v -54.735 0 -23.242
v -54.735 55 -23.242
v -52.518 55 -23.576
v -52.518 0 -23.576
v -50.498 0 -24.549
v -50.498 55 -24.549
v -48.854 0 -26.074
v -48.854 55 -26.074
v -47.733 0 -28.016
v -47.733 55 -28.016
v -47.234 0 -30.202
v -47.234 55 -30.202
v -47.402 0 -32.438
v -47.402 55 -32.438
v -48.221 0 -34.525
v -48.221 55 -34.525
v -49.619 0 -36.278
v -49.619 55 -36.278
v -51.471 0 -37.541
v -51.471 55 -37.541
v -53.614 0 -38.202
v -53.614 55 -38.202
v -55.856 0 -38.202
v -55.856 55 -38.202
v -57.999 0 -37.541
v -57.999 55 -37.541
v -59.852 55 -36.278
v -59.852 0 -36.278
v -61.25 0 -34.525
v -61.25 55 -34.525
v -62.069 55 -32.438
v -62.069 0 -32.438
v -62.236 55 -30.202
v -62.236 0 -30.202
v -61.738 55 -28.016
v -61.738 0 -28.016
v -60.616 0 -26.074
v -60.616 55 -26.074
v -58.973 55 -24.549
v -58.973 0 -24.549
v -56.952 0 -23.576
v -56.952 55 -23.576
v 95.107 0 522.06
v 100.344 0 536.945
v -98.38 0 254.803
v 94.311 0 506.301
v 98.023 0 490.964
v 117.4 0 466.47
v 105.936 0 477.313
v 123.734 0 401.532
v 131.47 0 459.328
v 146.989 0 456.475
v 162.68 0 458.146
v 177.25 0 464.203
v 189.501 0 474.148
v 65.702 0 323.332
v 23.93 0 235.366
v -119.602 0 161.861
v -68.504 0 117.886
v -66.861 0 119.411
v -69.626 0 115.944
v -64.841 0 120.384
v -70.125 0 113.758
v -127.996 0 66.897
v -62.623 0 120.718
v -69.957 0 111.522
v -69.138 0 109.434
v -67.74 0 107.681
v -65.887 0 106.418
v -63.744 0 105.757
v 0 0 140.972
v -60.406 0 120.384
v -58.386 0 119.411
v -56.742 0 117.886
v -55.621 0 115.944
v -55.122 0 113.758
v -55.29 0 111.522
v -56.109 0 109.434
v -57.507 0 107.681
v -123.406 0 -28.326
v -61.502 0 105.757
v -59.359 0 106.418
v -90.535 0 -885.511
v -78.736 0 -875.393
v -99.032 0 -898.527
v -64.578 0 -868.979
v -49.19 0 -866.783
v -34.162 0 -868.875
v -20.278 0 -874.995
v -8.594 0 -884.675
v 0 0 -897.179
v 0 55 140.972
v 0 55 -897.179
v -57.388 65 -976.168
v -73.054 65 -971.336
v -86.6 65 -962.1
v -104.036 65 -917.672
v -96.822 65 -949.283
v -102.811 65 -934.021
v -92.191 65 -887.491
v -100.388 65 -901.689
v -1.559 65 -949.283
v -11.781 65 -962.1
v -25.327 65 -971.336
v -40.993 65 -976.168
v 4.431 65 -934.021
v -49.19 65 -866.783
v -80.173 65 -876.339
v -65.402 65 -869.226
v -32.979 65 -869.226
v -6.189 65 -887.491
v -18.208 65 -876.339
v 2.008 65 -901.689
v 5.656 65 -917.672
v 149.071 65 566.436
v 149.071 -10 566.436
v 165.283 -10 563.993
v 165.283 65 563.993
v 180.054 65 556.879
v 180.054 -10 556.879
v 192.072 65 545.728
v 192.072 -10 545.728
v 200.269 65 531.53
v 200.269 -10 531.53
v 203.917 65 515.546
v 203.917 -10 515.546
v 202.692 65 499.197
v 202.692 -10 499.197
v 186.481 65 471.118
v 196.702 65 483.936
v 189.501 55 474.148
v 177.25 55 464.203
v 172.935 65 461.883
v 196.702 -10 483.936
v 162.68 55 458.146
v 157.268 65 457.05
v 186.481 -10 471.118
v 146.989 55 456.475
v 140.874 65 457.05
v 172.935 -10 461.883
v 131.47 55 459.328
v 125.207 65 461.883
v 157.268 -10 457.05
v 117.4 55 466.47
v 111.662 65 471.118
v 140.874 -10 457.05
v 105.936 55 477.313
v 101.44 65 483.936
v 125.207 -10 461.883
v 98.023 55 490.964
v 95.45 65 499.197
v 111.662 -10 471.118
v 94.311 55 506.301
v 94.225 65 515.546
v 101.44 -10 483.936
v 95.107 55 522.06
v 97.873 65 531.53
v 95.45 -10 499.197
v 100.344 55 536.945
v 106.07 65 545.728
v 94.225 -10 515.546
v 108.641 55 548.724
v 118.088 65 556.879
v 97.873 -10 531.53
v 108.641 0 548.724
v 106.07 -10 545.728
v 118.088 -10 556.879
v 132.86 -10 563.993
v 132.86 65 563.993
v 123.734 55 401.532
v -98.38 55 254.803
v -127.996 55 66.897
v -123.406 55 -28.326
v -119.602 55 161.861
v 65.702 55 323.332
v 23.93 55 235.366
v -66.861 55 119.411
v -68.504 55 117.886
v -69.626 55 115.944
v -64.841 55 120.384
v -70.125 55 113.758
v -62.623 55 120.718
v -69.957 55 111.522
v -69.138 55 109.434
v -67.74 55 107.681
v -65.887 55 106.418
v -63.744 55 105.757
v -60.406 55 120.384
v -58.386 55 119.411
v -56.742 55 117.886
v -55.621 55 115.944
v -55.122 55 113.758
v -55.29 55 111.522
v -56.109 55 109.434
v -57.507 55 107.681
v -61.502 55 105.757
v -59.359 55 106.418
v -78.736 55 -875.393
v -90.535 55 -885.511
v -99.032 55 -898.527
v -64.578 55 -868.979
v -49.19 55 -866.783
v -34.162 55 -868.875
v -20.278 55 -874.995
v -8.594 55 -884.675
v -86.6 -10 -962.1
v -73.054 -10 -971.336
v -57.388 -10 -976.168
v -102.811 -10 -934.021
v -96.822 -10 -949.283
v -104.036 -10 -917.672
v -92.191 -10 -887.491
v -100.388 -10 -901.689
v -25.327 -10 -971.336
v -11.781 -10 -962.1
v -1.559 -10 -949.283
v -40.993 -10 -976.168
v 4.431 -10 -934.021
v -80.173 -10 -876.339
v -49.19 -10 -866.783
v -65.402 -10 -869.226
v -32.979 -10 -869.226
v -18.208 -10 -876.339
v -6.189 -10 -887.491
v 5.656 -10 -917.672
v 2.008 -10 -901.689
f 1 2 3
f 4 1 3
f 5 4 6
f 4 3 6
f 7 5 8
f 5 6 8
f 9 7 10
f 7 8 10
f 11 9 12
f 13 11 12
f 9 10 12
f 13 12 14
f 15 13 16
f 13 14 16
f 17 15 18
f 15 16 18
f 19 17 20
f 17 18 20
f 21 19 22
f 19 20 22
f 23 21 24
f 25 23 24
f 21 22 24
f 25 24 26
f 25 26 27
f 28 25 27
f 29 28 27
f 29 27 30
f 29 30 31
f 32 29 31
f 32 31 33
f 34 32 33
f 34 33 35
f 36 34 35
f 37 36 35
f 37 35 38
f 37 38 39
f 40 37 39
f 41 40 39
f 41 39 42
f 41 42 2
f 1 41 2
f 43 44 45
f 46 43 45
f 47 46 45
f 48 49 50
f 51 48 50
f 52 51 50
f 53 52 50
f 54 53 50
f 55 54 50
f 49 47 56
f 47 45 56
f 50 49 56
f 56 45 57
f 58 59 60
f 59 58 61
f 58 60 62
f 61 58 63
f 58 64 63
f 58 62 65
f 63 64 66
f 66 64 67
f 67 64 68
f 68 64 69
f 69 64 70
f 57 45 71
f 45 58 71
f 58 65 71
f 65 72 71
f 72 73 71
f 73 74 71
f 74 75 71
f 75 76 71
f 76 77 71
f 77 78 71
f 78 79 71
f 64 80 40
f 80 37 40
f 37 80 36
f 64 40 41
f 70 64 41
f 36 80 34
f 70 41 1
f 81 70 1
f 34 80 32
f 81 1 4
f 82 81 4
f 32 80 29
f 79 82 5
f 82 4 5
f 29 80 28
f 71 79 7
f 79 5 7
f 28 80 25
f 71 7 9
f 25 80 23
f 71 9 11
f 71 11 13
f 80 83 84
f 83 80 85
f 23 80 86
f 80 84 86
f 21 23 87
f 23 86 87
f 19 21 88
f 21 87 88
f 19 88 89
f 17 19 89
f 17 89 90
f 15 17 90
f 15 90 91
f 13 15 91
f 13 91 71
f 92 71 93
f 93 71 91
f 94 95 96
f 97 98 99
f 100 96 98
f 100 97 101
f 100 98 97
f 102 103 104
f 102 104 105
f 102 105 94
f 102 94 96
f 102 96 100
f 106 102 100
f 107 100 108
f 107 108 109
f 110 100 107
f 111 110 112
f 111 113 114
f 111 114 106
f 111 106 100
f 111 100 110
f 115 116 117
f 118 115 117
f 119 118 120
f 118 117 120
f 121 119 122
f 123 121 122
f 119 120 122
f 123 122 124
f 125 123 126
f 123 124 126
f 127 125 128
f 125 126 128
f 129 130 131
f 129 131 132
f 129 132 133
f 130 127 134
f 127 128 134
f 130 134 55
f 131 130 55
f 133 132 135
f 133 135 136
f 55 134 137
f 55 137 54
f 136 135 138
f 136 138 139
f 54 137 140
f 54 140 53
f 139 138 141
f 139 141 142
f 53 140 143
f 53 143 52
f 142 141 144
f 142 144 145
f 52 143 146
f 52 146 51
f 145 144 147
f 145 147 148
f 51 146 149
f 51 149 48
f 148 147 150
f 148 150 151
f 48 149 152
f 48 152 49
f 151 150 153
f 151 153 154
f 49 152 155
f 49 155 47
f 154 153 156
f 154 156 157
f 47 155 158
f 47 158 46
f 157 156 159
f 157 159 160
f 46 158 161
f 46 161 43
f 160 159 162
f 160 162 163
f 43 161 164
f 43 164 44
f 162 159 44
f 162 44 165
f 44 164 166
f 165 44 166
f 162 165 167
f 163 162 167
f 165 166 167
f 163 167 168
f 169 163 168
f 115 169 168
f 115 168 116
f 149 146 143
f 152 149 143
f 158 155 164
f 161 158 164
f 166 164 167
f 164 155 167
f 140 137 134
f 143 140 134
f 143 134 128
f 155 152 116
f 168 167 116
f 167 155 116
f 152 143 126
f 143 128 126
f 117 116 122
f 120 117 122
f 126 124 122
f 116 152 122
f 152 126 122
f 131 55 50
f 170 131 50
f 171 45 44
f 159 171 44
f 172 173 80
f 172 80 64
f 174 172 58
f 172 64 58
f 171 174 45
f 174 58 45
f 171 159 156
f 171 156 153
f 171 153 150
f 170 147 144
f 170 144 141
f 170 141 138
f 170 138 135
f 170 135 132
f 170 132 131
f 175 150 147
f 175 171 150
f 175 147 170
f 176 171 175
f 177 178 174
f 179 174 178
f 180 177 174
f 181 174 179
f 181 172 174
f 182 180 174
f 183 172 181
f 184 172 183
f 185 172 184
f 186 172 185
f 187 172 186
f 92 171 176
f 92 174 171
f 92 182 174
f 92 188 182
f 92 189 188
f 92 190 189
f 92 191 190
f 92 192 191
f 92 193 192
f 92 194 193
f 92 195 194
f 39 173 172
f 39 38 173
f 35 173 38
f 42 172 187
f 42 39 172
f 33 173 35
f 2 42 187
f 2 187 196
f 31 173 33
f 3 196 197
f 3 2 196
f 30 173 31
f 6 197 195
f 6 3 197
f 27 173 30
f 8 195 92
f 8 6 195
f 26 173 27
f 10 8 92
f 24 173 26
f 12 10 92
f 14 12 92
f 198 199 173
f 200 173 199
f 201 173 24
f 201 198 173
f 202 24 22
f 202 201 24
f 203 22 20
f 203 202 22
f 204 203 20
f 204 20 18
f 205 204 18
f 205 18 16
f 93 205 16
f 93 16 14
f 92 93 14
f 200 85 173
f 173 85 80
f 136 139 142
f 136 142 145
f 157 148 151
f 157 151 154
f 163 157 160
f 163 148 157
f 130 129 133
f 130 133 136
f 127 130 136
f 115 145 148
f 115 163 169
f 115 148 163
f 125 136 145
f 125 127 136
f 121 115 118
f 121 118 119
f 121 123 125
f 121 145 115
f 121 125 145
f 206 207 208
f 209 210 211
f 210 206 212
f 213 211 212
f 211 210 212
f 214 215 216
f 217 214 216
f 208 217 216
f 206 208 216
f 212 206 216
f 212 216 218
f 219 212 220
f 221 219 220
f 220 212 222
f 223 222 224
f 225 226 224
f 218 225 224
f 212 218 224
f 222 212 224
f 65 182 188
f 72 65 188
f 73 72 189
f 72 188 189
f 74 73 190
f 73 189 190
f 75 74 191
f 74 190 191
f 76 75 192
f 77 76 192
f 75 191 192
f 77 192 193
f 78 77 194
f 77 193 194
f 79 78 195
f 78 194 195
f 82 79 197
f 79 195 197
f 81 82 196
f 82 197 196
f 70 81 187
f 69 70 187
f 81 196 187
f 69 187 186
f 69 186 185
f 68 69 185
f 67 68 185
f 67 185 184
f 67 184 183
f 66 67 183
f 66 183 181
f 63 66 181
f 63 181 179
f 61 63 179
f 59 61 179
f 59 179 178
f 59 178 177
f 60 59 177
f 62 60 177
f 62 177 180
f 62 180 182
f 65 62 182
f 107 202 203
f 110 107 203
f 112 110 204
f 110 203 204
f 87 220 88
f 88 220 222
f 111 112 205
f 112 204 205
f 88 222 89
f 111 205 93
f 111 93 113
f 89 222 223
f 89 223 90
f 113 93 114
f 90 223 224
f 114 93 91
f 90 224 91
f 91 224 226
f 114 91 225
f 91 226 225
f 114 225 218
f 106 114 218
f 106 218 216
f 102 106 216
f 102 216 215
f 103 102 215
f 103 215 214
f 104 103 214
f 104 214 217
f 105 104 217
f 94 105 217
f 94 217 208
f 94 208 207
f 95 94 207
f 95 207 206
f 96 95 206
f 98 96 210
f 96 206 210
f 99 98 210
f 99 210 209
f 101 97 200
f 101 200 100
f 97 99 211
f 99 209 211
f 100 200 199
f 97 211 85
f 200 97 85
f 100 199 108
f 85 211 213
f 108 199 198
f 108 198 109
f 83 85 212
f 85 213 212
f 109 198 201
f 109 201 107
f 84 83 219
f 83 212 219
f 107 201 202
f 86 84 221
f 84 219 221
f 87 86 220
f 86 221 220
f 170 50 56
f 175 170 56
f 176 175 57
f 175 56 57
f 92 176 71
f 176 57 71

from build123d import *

# Parameters (mm, degrees)
BOSS_EXTRUDE1_DEPTH      = 55
BOSS_EXTRUDE2_DEPTH      = 10
BOSS_EXTRUDE2_DEPTH_BACK = 65
SKETCH2_R                = 55
SKETCH3_R                = 7.522289104
CUT_EXTRUDE1_DEPTH       = 1000.987090528


with BuildPart() as part:
    # Sketch1 → Boss-Extrude1 (new body)
    with BuildSketch(Plane(origin=(0, 0, 0), x_dir=(1, 0, 0), z_dir=(0, 1, 0))):
        with BuildLine():
            Line((0, -140.97167407), (0, 921.782563534))
            Line((0, 921.782563534), (-98.380397364, 921.782563534))
            Line((-98.380397364, 921.782563534), (-123.405755698, 28.326097488))
            ThreePointArc((-123.405755698, 28.326097488), (-125.417562899, -114.522053174), (-98.380397364, -254.80260491))
            Line((-98.380397364, -254.80260491), (108.641172319, -548.724400702))
            Line((108.641172319, -548.724400702), (189.500983305, -474.147655215))
            Line((189.500983305, -474.147655215), (123.733893044, -401.532470648))
            ThreePointArc((123.733893044, -401.532470648), (42.669425171, -280.368501556), (0, -140.97167407))
        make_face()
    extrude(amount=BOSS_EXTRUDE1_DEPTH)

    # Sketch2 → Boss-Extrude2 (add, two sides: drawn at the far end of the back side and taken through both)
    with BuildSketch(Plane(origin=(0, 55, 0), x_dir=(1, 0, 0), z_dir=(0, 1, 0)).offset(-BOSS_EXTRUDE2_DEPTH_BACK)):
        with Locations(Location((149.071077812, -511.436027959, 0), (0, 0, 270))):
            Circle(SKETCH2_R)
        with Locations(Location((-49.190198682, 921.782563534, 0), (0, 0, 270))):
            Circle(SKETCH2_R)
    extrude(amount=BOSS_EXTRUDE2_DEPTH + BOSS_EXTRUDE2_DEPTH_BACK)

    # Sketch3 → Cut-Extrude1 (cut, through all)
    with BuildSketch(Plane(origin=(0, 55, 0), x_dir=(1, 0, 0), z_dir=(0, 1, 0))):
        with Locations(Location((-54.735242724, 30.764070808, 0), (0, 0, 270))):
            Circle(SKETCH3_R)
        with Locations(Location((-62.623286792, -113.195627247, 0), (0, 0, 270))):
            Circle(SKETCH3_R)
    extrude(amount=-CUT_EXTRUDE1_DEPTH, mode=Mode.SUBTRACT)


solid = part.part
